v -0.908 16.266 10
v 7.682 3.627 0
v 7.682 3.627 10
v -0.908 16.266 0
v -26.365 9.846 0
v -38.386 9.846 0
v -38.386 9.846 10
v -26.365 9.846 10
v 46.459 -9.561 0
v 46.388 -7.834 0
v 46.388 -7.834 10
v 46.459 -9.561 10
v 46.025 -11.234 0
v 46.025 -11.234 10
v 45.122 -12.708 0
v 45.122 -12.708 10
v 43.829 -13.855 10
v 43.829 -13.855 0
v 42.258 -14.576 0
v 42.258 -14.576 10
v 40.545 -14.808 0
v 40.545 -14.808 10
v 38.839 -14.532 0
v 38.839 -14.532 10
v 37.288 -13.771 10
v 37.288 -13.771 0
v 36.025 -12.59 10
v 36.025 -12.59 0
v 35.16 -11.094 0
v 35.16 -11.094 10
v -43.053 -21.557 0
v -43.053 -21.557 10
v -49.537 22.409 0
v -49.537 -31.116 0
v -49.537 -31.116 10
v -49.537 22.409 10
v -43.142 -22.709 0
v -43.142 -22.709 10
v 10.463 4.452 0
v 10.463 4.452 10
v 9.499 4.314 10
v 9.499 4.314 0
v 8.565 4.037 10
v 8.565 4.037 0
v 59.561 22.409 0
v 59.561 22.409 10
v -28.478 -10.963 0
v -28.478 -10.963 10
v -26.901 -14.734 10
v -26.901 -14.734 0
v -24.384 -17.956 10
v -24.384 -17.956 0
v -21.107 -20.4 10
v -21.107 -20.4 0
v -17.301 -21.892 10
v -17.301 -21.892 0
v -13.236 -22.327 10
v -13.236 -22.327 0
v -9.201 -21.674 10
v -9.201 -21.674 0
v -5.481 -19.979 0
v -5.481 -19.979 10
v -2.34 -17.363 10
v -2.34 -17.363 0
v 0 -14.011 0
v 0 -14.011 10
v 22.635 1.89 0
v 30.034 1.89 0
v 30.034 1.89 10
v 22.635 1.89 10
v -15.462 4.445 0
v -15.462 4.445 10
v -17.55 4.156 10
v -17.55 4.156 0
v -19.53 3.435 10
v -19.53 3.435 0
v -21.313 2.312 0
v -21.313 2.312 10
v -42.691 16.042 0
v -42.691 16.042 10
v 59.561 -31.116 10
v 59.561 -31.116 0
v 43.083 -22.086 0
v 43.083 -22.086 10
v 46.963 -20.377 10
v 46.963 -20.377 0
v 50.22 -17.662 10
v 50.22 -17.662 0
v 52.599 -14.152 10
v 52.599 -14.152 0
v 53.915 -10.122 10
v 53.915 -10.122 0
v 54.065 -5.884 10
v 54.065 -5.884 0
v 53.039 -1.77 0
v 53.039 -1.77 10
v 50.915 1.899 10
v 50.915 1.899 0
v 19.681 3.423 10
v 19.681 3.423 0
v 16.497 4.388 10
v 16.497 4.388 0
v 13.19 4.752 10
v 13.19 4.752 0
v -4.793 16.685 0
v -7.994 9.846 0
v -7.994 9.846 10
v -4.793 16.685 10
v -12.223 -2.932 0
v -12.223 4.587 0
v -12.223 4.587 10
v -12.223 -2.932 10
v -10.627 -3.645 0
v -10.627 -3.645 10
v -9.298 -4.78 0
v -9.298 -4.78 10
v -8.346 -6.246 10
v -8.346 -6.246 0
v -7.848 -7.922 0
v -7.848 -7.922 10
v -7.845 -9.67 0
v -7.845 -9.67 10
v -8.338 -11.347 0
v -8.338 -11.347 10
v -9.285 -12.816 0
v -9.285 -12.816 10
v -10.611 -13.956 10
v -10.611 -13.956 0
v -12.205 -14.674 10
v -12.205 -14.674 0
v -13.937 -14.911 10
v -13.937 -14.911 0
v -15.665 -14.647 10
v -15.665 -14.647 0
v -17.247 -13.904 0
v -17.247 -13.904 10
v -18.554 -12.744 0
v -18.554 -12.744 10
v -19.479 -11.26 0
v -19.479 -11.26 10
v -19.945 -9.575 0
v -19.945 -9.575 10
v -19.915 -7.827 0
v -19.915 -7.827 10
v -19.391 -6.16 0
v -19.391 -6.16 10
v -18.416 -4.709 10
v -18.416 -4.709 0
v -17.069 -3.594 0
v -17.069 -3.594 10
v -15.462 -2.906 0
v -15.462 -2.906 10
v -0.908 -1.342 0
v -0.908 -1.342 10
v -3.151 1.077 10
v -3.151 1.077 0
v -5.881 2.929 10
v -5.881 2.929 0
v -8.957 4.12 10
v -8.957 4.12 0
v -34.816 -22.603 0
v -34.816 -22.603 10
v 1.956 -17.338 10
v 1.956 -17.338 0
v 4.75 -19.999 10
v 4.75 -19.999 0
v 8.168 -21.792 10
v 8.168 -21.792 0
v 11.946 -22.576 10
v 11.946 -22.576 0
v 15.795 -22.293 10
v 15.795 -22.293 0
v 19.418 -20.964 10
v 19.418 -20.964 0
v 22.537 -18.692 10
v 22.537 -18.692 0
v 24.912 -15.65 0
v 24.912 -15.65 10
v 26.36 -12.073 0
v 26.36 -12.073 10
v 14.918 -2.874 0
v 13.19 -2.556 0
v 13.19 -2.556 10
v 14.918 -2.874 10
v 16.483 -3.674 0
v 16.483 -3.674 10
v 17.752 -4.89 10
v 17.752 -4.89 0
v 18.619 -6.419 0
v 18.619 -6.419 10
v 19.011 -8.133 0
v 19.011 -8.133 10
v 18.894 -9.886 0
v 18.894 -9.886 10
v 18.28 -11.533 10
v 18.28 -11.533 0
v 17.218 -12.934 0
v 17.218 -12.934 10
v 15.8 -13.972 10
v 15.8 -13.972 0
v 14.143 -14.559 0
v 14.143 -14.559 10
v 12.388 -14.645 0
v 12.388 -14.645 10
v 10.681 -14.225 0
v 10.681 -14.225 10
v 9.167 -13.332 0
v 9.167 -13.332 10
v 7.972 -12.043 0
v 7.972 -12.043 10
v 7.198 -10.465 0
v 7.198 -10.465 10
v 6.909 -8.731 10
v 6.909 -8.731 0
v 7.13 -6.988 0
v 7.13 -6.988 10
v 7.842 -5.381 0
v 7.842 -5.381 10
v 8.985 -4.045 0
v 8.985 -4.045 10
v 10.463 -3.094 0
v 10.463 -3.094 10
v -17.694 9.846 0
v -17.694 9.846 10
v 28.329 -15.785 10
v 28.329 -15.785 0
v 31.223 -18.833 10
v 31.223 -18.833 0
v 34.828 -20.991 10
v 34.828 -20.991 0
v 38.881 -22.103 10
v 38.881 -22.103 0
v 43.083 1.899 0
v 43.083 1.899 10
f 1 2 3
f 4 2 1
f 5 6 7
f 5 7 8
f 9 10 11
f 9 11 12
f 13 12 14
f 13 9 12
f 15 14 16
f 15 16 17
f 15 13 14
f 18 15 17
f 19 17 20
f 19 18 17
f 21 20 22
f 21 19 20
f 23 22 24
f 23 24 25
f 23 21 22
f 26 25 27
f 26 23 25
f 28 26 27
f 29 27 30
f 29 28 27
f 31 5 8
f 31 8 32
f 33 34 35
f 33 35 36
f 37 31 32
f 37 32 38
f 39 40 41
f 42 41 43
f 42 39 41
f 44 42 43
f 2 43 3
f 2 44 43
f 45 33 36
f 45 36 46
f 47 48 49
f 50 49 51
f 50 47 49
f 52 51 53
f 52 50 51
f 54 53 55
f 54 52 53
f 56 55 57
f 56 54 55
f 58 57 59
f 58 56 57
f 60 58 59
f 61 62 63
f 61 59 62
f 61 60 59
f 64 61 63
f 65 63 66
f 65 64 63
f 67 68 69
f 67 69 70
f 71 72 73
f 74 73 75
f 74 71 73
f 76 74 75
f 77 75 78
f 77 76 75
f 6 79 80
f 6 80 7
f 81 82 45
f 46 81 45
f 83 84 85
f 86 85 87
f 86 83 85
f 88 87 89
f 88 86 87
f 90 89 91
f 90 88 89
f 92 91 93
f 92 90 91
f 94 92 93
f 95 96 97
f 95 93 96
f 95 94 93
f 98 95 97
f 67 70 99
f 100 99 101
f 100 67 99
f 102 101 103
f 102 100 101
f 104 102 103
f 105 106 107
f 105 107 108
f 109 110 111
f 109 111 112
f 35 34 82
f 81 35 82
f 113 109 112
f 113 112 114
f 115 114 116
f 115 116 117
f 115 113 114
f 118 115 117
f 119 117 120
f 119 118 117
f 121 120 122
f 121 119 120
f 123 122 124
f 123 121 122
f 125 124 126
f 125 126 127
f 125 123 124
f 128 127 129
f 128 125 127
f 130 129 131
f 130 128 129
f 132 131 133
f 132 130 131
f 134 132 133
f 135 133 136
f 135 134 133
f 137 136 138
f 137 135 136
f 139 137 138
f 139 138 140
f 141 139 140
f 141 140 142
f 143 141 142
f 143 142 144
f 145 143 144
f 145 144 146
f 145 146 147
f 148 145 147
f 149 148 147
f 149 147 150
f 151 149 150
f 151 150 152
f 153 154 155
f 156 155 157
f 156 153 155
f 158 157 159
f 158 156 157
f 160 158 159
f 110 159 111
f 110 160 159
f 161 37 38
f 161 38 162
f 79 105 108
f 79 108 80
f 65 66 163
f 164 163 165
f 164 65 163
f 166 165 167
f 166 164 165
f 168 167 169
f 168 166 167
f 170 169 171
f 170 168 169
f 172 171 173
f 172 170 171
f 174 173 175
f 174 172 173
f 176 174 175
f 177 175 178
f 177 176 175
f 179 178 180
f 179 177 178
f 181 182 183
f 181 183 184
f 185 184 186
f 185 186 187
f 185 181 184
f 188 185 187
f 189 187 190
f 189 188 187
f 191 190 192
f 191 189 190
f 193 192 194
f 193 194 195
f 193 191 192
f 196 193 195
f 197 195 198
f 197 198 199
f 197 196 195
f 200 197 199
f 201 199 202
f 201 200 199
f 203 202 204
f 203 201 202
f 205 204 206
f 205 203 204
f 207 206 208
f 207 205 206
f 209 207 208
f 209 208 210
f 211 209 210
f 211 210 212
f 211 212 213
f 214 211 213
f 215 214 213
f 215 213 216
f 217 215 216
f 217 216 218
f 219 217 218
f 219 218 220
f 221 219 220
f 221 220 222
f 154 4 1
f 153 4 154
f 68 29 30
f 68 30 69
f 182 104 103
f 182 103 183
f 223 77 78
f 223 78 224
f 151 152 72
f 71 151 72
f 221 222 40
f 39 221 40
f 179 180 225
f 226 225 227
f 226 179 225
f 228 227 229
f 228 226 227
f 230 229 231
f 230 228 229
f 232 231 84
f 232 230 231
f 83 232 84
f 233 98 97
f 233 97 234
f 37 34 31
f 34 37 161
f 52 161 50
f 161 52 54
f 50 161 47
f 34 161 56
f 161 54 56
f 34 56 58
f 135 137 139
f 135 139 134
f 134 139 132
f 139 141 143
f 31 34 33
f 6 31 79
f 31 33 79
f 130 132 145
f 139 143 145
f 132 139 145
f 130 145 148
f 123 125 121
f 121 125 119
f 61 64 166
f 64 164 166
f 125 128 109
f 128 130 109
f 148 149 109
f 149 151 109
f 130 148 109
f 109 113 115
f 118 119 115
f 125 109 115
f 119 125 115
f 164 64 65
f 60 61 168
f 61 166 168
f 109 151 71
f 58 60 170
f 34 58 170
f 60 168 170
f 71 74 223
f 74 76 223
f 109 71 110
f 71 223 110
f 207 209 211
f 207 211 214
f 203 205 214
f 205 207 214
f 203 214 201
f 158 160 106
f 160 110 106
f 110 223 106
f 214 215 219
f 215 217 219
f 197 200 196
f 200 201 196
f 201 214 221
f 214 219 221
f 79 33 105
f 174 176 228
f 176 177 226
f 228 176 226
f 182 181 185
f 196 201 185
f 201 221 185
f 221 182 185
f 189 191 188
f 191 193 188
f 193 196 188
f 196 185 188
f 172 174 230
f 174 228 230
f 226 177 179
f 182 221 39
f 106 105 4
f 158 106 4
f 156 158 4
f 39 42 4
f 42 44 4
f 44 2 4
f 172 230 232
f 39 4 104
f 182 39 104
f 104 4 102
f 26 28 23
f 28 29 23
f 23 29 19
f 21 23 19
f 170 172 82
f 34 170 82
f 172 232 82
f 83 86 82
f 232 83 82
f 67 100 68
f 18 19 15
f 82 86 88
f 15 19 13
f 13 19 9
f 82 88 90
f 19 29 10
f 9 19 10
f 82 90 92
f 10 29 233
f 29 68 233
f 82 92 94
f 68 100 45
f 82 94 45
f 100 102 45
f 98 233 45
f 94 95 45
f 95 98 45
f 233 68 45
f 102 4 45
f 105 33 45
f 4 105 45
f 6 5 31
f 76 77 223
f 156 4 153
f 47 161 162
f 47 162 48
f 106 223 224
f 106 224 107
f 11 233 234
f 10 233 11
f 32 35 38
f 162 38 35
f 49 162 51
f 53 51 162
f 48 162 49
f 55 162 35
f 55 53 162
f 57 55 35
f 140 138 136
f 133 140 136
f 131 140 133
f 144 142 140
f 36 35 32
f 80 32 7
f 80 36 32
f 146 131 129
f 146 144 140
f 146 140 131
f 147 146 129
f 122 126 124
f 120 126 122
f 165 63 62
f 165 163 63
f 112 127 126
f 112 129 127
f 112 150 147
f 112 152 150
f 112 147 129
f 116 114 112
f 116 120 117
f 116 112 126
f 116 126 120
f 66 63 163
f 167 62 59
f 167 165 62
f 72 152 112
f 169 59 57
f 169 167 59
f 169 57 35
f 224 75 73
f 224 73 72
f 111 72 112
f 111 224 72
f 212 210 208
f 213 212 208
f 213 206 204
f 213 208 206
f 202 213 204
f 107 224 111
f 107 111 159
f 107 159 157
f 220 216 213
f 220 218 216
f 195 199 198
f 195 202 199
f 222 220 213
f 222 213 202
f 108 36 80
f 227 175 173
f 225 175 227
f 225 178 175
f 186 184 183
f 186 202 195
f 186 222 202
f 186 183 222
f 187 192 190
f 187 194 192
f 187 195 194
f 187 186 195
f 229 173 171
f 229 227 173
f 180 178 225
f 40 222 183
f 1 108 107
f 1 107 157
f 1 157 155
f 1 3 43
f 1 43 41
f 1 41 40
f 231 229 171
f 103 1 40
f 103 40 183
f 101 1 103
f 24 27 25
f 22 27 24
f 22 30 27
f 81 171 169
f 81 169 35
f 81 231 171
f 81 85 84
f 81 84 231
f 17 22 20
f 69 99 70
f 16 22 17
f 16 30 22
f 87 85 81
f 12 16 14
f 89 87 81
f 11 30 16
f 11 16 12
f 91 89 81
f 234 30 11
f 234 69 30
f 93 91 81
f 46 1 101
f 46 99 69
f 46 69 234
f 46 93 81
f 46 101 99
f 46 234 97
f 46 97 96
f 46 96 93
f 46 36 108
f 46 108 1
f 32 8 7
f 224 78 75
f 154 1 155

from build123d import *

# Parameters (mm, degrees)
F1_W     = 109.097563
F1_H     = 53.524394
F2_DEPTH = 10
F3_DEPTH = 20


with BuildPart() as f2:
    # F1 (on Top) → F2 (new body)
    with BuildSketch(Plane.XY):
        with Locations((5.012195, -4.353659)):
            Rectangle(F1_W, F1_H)
    extrude(amount=F2_DEPTH)

    # F0 (on Top) → F3 (cut)
    with BuildSketch(Plane.XY):
        with BuildLine():
            Line((-26.364613, 9.846089), (-43.052651, -21.557298))
            Line((-43.052651, -21.557298), (-43.142425, -22.709178))
            Line((-43.142425, -22.709178), (-34.816019, -22.603145))
            Line((-34.816019, -22.603145), (-28.477928, -10.9628))
            ThreePointArc((-28.477928, -10.9628), (-15.283365, -22.24516), (0, -14.010665))
            ThreePointArc((0, -14.010665), (13.880615, -22.568922), (26.360214, -12.072501))
            ThreePointArc((26.360214, -12.072501), (32.951882, -20.034667), (43.082863, -22.086348))
            ThreePointArc((43.082863, -22.086348), (53.397943, -12.183006), (50.914932, 1.899313))
            Line((50.914932, 1.899313), (43.082863, 1.899313))
            Line((43.082863, 1.899313), (46.387725, -7.834185))
            ThreePointArc((46.387725, -7.834185), (42.258111, -14.575967), (35.160247, -11.093775))
            Line((35.160247, -11.093775), (30.033628, 1.890382))
            Line((30.033628, 1.890382), (22.634767, 1.890382))
            ThreePointArc((22.634767, 1.890382), (18.111447, 3.978891), (13.189652, 4.752347))
            Line((13.189652, 4.752347), (13.189652, -2.555878))
            ThreePointArc((13.189652, -2.555878), (14.14297, -14.558516), (10.462902, -3.094257))
            Line((10.462902, -3.094257), (10.462902, 4.45175))
            ThreePointArc((10.462902, 4.45175), (9.026828, 4.192809), (7.681897, 3.626666))
            Line((7.681897, 3.626666), (-0.908288, 16.265618))
            Line((-0.908288, 16.265618), (-0.908288, -1.342427))
            ThreePointArc((-0.908288, -1.342427), (-5.880712, 2.929485), (-12.223111, 4.587256))
            Line((-12.223111, 4.587256), (-12.223111, -2.931808))
            ThreePointArc((-12.223111, -2.931808), (-13.936555, -14.910842), (-15.461971, -2.906415))
            Line((-15.461971, -2.906415), (-15.461971, 4.444678))
            ThreePointArc((-15.461971, 4.444678), (-18.558733, 3.847866), (-21.313343, 2.312209))
            Line((-21.313343, 2.312209), (-17.694002, 9.846089))
            Line((-17.694002, 9.846089), (-7.994306, 9.846089))
            Line((-7.994306, 9.846089), (-4.793087, 16.685043))
            Line((-4.793087, 16.685043), (-42.691354, 16.042456))
            Line((-42.691354, 16.042456), (-38.386457, 9.846089))
            Line((-38.386457, 9.846089), (-26.364613, 9.846089))
        make_face()
    extrude(amount=F3_DEPTH, mode=Mode.SUBTRACT)


solid = f2.part
